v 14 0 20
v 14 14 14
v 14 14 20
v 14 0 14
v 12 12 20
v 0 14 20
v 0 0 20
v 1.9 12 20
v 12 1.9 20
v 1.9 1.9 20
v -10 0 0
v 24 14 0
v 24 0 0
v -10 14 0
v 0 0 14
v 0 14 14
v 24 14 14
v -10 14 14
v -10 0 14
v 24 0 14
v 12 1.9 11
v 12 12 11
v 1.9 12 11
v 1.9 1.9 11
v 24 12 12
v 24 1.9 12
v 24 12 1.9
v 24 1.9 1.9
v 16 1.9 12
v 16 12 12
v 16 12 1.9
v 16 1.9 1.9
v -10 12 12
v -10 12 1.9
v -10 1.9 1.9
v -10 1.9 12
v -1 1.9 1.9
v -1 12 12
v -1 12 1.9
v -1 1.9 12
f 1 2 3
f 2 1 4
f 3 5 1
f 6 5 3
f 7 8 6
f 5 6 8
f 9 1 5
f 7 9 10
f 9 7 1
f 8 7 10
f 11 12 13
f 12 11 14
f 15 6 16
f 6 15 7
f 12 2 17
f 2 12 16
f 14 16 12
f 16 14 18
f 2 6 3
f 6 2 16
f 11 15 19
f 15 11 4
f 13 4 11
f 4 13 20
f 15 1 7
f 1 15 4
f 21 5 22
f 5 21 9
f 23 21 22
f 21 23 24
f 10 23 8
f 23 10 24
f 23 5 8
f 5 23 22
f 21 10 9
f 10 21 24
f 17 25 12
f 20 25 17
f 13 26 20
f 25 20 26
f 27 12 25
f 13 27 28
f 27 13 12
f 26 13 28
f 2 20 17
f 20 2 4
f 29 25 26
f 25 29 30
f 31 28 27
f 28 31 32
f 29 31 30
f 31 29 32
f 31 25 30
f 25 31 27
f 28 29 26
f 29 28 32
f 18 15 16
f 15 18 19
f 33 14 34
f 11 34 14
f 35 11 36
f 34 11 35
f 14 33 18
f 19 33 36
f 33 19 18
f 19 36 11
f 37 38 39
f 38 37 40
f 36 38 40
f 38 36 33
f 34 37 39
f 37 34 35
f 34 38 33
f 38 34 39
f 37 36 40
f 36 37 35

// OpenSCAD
difference()
{
  cube([14,14,20]);
  translate([1.9,1.9,11]) cube([10.1,10.1,10]);
}

difference()
{
  translate([14,0,0]) cube([10,14,14]);
  translate([16,1.9,1.9]) cube([10,10.1,10.1]);
}

difference()
{
  translate([-10,0,0]) cube([10,14,14]);
  translate([-11,1.9,1.9]) cube([10,10.1,10.1]);
}
